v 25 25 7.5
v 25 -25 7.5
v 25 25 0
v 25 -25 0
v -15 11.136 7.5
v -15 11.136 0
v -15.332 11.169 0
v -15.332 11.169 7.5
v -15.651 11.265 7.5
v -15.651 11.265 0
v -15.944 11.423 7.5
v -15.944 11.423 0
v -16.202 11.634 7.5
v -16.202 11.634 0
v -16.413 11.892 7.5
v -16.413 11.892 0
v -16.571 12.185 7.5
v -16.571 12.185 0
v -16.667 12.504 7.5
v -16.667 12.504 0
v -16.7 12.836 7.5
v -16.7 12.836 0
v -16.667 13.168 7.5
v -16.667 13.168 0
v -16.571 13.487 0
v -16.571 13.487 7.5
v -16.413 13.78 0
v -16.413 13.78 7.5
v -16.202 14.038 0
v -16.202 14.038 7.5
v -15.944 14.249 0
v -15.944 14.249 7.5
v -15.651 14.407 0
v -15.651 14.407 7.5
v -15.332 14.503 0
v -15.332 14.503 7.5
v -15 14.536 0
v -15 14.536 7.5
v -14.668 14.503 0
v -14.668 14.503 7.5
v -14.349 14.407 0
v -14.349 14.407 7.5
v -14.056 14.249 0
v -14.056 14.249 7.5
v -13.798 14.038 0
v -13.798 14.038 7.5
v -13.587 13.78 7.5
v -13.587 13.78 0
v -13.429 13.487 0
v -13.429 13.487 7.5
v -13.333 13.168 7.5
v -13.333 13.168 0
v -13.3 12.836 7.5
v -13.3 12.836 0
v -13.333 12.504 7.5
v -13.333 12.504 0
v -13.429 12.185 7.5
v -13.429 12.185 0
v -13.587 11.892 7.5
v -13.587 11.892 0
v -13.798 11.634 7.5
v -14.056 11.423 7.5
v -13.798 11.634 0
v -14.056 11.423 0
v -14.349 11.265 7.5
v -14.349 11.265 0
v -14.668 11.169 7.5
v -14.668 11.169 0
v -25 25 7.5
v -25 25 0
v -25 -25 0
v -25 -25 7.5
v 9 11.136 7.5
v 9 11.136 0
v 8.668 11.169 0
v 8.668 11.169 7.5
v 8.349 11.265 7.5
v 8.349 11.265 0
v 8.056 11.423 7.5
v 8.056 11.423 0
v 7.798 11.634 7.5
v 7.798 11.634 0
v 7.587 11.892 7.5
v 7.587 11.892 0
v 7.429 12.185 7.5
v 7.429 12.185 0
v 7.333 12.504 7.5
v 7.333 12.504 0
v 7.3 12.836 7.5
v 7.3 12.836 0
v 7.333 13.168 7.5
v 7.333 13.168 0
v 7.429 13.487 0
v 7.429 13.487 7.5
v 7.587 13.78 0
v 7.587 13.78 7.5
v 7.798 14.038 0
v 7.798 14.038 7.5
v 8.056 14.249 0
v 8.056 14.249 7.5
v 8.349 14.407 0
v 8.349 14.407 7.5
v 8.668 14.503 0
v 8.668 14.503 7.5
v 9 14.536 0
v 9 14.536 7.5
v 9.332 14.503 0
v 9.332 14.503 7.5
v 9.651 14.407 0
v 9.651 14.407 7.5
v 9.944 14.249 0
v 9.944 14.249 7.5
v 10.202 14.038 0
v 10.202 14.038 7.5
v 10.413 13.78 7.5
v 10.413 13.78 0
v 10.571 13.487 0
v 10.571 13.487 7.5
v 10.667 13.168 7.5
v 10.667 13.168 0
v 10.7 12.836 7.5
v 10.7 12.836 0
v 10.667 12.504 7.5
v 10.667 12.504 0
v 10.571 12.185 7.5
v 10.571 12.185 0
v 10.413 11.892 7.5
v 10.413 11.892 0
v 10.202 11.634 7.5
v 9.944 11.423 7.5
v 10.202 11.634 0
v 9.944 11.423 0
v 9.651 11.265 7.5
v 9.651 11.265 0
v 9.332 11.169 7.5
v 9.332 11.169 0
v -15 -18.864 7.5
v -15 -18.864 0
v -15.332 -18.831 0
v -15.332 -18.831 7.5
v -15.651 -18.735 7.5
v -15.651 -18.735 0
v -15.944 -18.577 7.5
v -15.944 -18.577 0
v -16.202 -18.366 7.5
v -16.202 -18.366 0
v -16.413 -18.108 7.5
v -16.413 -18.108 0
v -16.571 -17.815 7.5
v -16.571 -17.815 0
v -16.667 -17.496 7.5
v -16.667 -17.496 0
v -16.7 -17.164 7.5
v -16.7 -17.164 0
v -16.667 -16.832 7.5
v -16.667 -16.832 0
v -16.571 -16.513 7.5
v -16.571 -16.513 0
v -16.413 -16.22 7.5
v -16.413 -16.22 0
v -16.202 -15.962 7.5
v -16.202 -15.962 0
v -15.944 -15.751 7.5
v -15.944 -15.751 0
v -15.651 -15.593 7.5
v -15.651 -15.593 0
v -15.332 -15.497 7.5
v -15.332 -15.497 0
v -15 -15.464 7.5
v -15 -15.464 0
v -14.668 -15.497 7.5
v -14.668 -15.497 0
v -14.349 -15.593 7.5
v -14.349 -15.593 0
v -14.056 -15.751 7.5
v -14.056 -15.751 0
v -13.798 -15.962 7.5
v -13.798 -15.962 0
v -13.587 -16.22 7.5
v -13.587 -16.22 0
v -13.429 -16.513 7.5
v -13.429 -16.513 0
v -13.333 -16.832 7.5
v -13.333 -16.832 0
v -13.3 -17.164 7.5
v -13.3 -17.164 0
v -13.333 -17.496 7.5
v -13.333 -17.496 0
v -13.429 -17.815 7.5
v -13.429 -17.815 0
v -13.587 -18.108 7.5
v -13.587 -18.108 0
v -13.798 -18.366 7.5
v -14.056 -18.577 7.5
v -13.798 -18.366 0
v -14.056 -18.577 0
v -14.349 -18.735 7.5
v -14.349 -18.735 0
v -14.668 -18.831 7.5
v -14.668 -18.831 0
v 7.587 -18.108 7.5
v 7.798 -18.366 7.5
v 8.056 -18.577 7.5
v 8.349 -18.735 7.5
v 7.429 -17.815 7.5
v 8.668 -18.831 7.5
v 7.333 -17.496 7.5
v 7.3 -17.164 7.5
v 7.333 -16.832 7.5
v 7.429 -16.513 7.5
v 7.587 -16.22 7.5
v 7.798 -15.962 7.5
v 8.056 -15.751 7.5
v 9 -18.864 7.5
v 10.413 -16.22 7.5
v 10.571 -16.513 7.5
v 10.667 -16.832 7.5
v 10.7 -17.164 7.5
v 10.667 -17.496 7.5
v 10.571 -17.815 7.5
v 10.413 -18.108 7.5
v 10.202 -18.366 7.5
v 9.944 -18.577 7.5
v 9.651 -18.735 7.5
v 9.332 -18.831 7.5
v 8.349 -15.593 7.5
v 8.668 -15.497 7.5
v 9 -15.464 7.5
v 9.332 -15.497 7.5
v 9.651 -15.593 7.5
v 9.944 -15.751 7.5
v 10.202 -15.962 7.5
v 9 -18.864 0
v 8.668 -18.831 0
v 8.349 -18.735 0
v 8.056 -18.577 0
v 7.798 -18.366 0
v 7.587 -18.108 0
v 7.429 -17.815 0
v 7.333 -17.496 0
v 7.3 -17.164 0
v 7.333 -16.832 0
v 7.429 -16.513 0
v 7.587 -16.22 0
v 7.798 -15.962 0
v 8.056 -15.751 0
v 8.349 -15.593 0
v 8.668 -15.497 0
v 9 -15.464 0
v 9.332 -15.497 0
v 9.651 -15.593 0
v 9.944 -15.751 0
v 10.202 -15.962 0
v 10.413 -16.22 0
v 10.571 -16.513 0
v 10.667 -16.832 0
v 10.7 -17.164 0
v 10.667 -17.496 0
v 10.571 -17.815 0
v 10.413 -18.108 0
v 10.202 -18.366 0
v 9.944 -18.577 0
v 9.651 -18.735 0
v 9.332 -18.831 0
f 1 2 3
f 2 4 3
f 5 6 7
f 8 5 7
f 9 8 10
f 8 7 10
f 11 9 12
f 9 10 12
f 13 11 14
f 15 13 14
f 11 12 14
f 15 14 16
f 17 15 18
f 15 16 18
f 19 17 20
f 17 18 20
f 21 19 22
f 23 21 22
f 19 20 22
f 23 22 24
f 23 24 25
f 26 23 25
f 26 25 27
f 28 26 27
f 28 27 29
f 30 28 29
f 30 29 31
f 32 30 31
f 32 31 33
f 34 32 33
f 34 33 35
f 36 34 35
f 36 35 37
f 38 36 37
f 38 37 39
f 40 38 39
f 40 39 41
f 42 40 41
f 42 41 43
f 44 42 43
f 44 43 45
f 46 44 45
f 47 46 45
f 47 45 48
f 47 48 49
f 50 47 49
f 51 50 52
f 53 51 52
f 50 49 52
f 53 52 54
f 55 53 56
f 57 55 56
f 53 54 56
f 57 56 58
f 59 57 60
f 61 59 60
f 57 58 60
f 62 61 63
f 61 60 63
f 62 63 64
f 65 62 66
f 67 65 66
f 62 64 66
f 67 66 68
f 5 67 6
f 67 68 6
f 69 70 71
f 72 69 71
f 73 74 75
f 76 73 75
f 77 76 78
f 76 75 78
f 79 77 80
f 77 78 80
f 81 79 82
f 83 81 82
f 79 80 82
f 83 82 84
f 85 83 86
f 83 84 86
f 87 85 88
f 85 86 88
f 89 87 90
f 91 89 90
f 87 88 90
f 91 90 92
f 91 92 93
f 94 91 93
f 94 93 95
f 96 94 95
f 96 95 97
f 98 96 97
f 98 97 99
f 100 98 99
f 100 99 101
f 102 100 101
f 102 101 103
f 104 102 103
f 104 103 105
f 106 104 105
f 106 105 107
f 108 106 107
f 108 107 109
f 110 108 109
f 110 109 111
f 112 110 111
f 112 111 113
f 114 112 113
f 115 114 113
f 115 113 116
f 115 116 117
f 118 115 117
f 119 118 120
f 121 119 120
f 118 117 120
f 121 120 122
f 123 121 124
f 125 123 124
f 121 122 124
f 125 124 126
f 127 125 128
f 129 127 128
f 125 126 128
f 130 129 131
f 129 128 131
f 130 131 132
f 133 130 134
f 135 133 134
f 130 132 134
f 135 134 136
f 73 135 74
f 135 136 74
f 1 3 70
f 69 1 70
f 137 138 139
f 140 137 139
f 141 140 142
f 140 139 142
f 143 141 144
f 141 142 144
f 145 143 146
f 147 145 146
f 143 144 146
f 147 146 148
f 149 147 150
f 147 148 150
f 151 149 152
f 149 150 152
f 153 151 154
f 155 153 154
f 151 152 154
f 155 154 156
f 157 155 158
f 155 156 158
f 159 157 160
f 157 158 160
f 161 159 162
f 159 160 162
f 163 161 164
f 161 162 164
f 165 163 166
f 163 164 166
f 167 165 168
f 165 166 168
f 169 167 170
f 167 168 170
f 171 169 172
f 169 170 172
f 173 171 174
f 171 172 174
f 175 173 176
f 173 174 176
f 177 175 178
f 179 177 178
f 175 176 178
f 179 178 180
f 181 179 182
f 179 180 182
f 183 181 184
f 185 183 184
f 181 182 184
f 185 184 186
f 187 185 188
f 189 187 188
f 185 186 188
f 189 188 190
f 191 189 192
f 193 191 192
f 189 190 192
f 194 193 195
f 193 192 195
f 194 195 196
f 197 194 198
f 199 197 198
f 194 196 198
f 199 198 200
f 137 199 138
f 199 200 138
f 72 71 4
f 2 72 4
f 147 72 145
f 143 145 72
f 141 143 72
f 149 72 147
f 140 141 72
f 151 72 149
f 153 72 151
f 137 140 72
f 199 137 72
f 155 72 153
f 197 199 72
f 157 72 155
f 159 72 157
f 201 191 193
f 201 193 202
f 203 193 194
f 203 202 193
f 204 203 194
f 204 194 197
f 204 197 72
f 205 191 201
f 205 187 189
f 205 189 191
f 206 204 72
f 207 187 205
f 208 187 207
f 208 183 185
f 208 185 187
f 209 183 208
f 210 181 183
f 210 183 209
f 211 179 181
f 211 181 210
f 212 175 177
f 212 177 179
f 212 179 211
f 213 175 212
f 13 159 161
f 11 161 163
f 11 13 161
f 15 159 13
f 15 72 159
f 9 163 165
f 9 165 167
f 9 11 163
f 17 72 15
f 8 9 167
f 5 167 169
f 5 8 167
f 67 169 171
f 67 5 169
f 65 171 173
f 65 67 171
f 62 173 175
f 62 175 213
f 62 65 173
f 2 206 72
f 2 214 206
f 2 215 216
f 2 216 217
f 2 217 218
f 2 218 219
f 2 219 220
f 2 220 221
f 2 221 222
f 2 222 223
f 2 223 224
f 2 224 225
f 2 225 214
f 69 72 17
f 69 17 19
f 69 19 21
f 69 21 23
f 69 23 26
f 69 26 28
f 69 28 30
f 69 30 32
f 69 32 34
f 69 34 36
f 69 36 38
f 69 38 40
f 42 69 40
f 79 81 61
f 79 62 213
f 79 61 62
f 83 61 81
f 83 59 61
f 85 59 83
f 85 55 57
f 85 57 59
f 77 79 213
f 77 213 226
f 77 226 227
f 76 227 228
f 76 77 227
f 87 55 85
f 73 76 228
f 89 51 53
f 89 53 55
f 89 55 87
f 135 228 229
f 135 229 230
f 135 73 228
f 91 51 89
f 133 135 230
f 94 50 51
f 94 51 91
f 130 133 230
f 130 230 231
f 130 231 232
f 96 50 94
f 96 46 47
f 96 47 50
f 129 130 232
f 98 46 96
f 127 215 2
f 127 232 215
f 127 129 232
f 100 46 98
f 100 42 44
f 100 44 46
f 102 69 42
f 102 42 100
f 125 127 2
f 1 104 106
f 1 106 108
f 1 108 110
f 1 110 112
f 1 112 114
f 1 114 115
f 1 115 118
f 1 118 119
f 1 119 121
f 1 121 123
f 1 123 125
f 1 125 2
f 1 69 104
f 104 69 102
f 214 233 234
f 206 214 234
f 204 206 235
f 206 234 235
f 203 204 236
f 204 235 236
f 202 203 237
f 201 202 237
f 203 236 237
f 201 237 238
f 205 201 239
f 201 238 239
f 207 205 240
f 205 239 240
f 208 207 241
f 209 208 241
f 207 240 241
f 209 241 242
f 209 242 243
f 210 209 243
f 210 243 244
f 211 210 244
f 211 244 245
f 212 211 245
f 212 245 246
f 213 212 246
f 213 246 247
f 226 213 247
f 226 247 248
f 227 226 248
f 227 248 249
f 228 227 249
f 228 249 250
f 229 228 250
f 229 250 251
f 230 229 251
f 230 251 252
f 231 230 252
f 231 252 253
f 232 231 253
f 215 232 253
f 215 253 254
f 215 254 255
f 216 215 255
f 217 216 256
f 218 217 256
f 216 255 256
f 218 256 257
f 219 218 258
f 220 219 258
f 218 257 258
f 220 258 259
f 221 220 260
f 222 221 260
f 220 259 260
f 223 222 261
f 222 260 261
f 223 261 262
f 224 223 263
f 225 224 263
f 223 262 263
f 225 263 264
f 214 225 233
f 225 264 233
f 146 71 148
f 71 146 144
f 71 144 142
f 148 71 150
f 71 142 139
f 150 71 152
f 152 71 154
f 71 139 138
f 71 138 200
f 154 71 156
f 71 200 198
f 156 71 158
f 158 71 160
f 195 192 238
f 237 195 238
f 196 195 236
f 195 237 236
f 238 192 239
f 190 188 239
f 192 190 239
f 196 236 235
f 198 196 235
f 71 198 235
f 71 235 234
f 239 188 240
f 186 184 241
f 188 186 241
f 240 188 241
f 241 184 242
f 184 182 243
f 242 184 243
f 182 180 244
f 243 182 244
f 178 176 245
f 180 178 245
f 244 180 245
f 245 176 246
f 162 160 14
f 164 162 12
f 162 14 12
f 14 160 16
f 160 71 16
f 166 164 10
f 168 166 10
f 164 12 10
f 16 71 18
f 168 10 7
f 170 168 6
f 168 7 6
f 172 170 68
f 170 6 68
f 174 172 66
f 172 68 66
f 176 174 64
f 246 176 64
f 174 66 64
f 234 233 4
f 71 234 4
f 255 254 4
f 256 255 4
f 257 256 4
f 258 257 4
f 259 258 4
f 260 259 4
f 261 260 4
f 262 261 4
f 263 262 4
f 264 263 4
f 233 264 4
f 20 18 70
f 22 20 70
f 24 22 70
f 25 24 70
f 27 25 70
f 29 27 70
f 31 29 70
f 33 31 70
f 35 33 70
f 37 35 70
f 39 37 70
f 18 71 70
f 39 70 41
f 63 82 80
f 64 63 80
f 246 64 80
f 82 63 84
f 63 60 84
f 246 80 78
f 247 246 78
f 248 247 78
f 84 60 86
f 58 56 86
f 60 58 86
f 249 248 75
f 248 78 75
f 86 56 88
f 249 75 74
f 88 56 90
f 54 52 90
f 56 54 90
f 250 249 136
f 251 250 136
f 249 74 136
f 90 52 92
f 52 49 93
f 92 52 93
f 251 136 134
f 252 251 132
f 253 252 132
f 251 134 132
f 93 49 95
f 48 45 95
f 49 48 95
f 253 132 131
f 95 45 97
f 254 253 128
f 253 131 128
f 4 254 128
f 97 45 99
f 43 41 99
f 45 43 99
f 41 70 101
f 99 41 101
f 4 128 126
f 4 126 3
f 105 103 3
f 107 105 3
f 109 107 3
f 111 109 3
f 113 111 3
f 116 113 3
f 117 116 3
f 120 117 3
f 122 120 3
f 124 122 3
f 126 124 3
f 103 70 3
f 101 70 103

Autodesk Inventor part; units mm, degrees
ref_plane "YZ Plane" through (0, 0, 0) normal (1, 0, 0) x (0, 1, 0)
ref_plane "XZ Plane" through (0, 0, 0) normal (0, 1, 0) x (-1, 0, 0)
ref_plane "XY Plane" through (0, 0, 0) normal (0, 0, 1) x (1, 0, 0)
sketch "スケッチ1" plane through (0, 0, 0) normal (0, 0, 1) x (1, 0, 0)
  line L0 (-25, -25) -> (25, -25)
  line L1 (25, -25) -> (25, 25)
  line L2 (25, 25) -> (-25, 25)
  line L3 (-25, 25) -> (-25, -25)
  line L4 (-25, -25) -> (25, 25) construction
  line L5 (25, -25) -> (-25, 25) construction
  point P0 (0, 0)
  dimension "d0" = 50
  dimension "d1" = 50
extrude "押し出し1" add sketch "スケッチ1" along normal blind 7.5
sketch "スケッチ2" plane through (0, 0, 7.5) normal (0, 0, 1) x (1, 0, 0)
  line L0 (-25, 25) -> (-25, -25) projected
  line L1 (-25, -25) -> (25, -25) projected
  point P0 (0, 0)
  point P1 (-15, 12.836)
  point P2 (9, 12.836)
  point P3 (9, -17.164)
  point P4 (-15, -17.164)
  dimension "d4" = 10
  dimension "d5" = 10
  dimension "d6" = 30
  dimension "d7" = 30
  dimension "d8" = 24
  dimension "d16" = 7.836
  dimension "d17" = 7.836
hole "穴1" at (-15, 12.836, 7.5) at (9, 12.836, 7.5) at (9, -17.164, 7.5) at (-15, -17.164, 7.5) direction (0, 0, -1) diameter 3.4 end through all clearance for "Flat Head Machine Screw" size "M3" standard "Ansi Metric M Profile"
properties part number "20220509_知能ロボットキャスタ"
